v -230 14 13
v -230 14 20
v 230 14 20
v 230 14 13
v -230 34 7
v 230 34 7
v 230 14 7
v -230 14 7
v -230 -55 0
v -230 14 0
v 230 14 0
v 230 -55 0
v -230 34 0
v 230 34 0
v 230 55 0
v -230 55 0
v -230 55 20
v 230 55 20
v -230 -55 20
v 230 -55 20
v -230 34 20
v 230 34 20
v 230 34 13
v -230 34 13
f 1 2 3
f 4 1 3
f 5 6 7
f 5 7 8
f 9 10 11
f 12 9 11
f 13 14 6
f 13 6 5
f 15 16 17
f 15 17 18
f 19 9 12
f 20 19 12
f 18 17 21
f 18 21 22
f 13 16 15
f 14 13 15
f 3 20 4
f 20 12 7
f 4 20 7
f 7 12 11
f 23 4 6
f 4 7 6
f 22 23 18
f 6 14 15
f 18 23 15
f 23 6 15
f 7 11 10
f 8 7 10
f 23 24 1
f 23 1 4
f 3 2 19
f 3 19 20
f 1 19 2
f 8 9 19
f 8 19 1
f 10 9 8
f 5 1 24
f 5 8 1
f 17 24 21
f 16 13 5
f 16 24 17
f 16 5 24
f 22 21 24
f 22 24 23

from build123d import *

# Parameters (mm, degrees)
CROQUIS1_W              = 460
CROQUIS1_H              = 110
SALIENTE_EXTRUIR1_DEPTH = 20
CROQUIS8_W              = 480
CROQUIS8_H              = 20
CORTAR_EXTRUIR3_DEPTH   = 7
CROQUIS9_W              = 470
CROQUIS9_H              = 20
CORTAR_EXTRUIR4_DEPTH   = 7


with BuildPart() as part:
    # Croquis1 → Saliente-Extruir1 (new body)
    with BuildSketch(Plane.XY):
        Rectangle(CROQUIS1_W, CROQUIS1_H)
    extrude(amount=SALIENTE_EXTRUIR1_DEPTH)

    # Croquis8 → Cortar-Extruir3 (cut)
    with BuildSketch(Plane.XY.offset(20)):
        with Locations((-10, 24)):
            Rectangle(CROQUIS8_W, CROQUIS8_H)
    extrude(amount=-CORTAR_EXTRUIR3_DEPTH, mode=Mode.SUBTRACT)

    # Croquis9 → Cortar-Extruir4 (cut)
    with BuildSketch(Plane(origin=(0, 0, 0), x_dir=(-1, 0, 0), z_dir=(0, 0, -1))):
        with Locations((-5, 24)):
            Rectangle(CROQUIS9_W, CROQUIS9_H)
    extrude(amount=-CORTAR_EXTRUIR4_DEPTH, mode=Mode.SUBTRACT)


solid = part.part
